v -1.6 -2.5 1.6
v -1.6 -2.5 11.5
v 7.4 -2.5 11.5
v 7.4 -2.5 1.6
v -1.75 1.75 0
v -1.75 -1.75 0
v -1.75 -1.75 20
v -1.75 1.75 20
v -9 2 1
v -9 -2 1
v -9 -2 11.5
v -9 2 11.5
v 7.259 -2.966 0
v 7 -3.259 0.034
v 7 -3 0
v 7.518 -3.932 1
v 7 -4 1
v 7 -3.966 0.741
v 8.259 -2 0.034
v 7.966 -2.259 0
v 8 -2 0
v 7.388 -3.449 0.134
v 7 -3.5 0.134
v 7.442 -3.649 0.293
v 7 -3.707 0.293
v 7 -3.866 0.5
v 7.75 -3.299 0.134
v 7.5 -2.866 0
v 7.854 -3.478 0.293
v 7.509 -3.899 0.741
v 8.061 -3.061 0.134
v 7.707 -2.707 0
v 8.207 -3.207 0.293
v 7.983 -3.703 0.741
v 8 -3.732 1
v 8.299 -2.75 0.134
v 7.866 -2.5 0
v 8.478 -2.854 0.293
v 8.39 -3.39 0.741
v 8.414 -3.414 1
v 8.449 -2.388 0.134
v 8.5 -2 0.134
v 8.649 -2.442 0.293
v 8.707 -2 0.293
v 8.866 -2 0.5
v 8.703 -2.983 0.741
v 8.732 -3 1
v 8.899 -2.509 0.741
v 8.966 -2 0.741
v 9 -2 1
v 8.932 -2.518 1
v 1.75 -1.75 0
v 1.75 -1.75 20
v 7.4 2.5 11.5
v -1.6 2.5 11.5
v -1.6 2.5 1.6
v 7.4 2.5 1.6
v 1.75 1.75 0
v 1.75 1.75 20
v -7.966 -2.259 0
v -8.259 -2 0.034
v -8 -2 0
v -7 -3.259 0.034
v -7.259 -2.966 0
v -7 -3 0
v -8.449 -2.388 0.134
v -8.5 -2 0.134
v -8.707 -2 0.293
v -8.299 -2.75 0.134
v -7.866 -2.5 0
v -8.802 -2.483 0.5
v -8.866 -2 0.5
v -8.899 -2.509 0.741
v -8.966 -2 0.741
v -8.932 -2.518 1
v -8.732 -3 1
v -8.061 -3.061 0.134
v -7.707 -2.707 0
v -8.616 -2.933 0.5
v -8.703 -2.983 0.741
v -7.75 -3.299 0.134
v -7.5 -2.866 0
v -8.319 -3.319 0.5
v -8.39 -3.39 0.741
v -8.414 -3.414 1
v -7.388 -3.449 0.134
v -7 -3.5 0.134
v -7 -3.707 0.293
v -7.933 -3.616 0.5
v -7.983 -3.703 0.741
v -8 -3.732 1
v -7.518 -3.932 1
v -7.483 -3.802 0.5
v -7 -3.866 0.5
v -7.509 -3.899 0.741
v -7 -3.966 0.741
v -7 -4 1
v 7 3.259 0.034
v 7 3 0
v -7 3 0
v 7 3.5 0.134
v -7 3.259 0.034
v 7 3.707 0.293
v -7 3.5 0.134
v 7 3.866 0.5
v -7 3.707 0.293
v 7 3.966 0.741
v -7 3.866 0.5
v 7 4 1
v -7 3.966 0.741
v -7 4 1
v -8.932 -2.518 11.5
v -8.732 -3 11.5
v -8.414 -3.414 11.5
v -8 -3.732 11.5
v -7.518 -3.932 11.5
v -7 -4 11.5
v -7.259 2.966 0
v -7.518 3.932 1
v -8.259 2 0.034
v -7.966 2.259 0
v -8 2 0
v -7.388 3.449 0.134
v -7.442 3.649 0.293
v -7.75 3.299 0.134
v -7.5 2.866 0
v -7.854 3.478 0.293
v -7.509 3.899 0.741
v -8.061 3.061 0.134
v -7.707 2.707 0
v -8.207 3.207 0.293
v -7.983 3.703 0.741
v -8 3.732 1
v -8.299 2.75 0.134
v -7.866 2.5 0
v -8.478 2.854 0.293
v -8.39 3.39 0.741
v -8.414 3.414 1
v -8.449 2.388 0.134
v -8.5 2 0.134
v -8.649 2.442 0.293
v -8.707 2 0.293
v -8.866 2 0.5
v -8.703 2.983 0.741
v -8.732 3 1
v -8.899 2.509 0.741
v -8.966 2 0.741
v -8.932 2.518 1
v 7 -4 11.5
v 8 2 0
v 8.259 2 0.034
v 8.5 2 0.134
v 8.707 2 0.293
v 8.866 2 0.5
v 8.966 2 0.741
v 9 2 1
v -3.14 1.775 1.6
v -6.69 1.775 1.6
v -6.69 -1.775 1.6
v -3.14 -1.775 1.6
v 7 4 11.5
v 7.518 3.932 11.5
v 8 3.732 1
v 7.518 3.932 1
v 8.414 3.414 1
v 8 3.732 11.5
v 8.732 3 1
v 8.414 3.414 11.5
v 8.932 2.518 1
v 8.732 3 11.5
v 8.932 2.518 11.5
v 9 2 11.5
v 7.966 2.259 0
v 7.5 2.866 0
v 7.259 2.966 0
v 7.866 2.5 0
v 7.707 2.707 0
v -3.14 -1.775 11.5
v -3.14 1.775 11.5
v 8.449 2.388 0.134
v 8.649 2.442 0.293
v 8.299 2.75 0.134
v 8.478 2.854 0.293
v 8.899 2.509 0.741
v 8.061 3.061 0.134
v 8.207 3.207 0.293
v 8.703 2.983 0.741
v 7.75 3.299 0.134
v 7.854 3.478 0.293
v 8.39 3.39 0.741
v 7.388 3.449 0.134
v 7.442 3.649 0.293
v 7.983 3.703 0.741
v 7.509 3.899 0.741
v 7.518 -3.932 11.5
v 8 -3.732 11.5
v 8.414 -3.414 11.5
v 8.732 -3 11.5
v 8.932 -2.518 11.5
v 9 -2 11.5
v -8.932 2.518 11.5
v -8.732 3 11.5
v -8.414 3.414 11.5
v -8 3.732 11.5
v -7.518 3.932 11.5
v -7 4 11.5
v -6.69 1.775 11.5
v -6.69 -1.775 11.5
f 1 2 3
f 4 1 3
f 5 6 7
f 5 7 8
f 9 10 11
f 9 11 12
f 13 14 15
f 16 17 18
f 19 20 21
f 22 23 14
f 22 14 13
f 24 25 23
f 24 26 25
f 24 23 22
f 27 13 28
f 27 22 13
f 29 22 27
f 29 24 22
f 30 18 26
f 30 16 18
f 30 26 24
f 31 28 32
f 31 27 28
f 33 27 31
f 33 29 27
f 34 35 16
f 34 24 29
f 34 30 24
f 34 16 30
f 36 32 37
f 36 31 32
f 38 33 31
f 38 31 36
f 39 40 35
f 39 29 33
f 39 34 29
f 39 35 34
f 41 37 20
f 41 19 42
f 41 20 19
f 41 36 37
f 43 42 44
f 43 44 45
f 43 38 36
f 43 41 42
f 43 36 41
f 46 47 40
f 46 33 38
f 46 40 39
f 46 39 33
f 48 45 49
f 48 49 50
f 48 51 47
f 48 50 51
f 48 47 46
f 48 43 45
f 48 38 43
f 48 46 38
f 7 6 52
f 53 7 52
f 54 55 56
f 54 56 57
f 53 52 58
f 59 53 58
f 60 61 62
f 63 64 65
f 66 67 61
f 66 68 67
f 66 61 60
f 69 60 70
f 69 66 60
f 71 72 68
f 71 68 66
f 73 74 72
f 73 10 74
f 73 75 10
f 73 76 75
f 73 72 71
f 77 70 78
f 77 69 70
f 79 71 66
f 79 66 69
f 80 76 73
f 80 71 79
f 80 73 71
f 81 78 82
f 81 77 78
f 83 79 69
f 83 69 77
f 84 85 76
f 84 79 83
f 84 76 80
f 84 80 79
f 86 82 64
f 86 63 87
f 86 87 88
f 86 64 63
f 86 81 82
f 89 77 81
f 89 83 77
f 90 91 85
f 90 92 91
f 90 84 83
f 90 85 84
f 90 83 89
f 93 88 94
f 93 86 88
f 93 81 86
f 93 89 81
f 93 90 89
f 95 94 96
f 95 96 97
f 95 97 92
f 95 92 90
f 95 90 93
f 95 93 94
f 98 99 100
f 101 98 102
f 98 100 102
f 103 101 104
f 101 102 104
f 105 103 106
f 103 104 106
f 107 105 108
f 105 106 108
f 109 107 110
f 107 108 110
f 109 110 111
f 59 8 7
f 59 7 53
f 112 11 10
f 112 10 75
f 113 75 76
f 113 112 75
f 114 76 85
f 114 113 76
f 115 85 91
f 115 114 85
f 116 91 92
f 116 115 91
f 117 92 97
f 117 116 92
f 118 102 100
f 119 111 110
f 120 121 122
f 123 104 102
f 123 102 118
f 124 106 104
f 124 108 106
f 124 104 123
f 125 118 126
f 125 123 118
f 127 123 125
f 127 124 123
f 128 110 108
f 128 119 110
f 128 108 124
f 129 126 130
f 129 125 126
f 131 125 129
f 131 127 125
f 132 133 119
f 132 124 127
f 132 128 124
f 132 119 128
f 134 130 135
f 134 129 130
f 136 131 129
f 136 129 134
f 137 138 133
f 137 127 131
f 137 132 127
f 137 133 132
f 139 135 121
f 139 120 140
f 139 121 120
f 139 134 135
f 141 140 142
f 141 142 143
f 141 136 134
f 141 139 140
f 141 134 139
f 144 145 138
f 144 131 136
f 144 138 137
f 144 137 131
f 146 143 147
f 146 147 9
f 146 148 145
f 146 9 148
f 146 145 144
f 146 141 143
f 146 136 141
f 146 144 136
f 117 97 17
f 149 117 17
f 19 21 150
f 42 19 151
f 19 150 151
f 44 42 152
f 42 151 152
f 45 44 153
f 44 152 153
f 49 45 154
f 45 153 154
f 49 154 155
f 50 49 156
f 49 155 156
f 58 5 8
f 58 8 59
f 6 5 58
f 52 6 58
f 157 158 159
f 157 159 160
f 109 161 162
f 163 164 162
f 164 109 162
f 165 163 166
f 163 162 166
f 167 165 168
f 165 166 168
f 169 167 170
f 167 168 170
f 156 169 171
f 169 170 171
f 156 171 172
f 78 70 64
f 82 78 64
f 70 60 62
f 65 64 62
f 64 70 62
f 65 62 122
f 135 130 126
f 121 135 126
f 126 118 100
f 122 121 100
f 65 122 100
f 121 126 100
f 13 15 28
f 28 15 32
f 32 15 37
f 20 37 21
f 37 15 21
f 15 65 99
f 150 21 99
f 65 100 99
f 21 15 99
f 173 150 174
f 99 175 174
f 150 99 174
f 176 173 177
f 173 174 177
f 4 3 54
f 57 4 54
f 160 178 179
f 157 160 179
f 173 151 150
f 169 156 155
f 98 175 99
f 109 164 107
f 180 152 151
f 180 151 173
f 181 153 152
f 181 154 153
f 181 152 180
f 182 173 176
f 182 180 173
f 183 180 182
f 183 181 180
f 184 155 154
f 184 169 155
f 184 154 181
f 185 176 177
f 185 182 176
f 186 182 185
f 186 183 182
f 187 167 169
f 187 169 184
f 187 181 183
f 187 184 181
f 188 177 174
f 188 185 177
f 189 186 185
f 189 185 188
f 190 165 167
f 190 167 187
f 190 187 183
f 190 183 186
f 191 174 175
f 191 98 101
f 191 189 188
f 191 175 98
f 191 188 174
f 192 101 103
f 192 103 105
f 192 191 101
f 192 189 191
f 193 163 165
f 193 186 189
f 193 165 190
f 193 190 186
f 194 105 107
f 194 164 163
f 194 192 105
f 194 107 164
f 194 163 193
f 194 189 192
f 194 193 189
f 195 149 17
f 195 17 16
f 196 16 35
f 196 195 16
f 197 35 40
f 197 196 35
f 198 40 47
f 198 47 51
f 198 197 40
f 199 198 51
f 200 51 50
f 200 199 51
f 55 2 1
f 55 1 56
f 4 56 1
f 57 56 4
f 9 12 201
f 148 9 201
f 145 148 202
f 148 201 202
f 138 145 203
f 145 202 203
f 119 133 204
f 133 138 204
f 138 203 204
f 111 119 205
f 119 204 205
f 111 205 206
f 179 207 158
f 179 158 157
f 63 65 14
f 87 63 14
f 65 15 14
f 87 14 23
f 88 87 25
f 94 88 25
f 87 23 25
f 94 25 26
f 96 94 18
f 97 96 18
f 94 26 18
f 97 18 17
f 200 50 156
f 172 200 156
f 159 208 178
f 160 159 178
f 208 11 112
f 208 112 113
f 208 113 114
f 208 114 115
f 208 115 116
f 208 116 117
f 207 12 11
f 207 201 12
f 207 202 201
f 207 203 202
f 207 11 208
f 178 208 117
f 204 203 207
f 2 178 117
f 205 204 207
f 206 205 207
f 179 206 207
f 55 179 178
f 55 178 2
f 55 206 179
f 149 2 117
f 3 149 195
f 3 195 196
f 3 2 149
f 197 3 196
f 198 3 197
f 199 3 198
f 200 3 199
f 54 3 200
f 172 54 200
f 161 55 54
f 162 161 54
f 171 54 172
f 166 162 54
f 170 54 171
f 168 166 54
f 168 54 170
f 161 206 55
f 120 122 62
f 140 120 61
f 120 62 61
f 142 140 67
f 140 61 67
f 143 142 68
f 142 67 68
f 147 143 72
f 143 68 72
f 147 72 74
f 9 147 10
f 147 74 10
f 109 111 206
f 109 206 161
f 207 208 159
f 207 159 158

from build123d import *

# Parameters (mm, degrees)
SKETCH_W      = 18
SKETCH_H      = 8
PAD_DEPTH     = 11.5
SKETCH001_W   = 9
SKETCH001_H   = 5
SKETCH001_W_2 = 3.55
SKETCH001_H_2 = 3.55
POCKET_DEPTH  = 9.9
FILLET_R      = 2
FILLET001_R   = 1
SKETCH002_W   = 3.5
SKETCH002_H   = 3.5
PAD001_DEPTH  = 20


with BuildPart() as body:
    # Sketch (on XY_Plane of Origin) → Pad (new body)
    with BuildSketch(Plane.XY):
        Rectangle(SKETCH_W, SKETCH_H)
    extrude(amount=PAD_DEPTH)

    # Sketch001 (on Face6 of Pad) → Pocket (cut)
    with BuildSketch(Plane.XY.offset(11.5)):
        with Locations((2.9, 0)):
            Rectangle(SKETCH001_W, SKETCH001_H)
        with Locations((-4.915, 0)):
            Rectangle(SKETCH001_W_2, SKETCH001_H_2)
    extrude(amount=-POCKET_DEPTH, mode=Mode.SUBTRACT)

    # Fillet
    fillet_edges = [body.edges().sort_by_distance(p)[0] for p in [
        (9, -4, 5.75),
        (9, 4, 5.75),
        (-9, -4, 5.75),
        (-9, 4, 5.75),
    ]]
    fillet(fillet_edges, radius=FILLET_R)

    # Fillet001
    fillet001_edges = [body.edges().sort_by_distance(p)[0] for p in [
        (0, -4, 0),
        (0, 4, 0),
        (9, 0, 0),
        (-9, 0, 0),
    ]]
    fillet(fillet001_edges, radius=FILLET001_R)


with BuildPart() as body001:
    # Sketch002 (on XY_Plane001 of Origin002) → Pad001 (new body)
    with BuildSketch(Plane.XY):
        Rectangle(SKETCH002_W, SKETCH002_H)
    extrude(amount=PAD001_DEPTH)


solid = Compound([body.part, body001.part])
